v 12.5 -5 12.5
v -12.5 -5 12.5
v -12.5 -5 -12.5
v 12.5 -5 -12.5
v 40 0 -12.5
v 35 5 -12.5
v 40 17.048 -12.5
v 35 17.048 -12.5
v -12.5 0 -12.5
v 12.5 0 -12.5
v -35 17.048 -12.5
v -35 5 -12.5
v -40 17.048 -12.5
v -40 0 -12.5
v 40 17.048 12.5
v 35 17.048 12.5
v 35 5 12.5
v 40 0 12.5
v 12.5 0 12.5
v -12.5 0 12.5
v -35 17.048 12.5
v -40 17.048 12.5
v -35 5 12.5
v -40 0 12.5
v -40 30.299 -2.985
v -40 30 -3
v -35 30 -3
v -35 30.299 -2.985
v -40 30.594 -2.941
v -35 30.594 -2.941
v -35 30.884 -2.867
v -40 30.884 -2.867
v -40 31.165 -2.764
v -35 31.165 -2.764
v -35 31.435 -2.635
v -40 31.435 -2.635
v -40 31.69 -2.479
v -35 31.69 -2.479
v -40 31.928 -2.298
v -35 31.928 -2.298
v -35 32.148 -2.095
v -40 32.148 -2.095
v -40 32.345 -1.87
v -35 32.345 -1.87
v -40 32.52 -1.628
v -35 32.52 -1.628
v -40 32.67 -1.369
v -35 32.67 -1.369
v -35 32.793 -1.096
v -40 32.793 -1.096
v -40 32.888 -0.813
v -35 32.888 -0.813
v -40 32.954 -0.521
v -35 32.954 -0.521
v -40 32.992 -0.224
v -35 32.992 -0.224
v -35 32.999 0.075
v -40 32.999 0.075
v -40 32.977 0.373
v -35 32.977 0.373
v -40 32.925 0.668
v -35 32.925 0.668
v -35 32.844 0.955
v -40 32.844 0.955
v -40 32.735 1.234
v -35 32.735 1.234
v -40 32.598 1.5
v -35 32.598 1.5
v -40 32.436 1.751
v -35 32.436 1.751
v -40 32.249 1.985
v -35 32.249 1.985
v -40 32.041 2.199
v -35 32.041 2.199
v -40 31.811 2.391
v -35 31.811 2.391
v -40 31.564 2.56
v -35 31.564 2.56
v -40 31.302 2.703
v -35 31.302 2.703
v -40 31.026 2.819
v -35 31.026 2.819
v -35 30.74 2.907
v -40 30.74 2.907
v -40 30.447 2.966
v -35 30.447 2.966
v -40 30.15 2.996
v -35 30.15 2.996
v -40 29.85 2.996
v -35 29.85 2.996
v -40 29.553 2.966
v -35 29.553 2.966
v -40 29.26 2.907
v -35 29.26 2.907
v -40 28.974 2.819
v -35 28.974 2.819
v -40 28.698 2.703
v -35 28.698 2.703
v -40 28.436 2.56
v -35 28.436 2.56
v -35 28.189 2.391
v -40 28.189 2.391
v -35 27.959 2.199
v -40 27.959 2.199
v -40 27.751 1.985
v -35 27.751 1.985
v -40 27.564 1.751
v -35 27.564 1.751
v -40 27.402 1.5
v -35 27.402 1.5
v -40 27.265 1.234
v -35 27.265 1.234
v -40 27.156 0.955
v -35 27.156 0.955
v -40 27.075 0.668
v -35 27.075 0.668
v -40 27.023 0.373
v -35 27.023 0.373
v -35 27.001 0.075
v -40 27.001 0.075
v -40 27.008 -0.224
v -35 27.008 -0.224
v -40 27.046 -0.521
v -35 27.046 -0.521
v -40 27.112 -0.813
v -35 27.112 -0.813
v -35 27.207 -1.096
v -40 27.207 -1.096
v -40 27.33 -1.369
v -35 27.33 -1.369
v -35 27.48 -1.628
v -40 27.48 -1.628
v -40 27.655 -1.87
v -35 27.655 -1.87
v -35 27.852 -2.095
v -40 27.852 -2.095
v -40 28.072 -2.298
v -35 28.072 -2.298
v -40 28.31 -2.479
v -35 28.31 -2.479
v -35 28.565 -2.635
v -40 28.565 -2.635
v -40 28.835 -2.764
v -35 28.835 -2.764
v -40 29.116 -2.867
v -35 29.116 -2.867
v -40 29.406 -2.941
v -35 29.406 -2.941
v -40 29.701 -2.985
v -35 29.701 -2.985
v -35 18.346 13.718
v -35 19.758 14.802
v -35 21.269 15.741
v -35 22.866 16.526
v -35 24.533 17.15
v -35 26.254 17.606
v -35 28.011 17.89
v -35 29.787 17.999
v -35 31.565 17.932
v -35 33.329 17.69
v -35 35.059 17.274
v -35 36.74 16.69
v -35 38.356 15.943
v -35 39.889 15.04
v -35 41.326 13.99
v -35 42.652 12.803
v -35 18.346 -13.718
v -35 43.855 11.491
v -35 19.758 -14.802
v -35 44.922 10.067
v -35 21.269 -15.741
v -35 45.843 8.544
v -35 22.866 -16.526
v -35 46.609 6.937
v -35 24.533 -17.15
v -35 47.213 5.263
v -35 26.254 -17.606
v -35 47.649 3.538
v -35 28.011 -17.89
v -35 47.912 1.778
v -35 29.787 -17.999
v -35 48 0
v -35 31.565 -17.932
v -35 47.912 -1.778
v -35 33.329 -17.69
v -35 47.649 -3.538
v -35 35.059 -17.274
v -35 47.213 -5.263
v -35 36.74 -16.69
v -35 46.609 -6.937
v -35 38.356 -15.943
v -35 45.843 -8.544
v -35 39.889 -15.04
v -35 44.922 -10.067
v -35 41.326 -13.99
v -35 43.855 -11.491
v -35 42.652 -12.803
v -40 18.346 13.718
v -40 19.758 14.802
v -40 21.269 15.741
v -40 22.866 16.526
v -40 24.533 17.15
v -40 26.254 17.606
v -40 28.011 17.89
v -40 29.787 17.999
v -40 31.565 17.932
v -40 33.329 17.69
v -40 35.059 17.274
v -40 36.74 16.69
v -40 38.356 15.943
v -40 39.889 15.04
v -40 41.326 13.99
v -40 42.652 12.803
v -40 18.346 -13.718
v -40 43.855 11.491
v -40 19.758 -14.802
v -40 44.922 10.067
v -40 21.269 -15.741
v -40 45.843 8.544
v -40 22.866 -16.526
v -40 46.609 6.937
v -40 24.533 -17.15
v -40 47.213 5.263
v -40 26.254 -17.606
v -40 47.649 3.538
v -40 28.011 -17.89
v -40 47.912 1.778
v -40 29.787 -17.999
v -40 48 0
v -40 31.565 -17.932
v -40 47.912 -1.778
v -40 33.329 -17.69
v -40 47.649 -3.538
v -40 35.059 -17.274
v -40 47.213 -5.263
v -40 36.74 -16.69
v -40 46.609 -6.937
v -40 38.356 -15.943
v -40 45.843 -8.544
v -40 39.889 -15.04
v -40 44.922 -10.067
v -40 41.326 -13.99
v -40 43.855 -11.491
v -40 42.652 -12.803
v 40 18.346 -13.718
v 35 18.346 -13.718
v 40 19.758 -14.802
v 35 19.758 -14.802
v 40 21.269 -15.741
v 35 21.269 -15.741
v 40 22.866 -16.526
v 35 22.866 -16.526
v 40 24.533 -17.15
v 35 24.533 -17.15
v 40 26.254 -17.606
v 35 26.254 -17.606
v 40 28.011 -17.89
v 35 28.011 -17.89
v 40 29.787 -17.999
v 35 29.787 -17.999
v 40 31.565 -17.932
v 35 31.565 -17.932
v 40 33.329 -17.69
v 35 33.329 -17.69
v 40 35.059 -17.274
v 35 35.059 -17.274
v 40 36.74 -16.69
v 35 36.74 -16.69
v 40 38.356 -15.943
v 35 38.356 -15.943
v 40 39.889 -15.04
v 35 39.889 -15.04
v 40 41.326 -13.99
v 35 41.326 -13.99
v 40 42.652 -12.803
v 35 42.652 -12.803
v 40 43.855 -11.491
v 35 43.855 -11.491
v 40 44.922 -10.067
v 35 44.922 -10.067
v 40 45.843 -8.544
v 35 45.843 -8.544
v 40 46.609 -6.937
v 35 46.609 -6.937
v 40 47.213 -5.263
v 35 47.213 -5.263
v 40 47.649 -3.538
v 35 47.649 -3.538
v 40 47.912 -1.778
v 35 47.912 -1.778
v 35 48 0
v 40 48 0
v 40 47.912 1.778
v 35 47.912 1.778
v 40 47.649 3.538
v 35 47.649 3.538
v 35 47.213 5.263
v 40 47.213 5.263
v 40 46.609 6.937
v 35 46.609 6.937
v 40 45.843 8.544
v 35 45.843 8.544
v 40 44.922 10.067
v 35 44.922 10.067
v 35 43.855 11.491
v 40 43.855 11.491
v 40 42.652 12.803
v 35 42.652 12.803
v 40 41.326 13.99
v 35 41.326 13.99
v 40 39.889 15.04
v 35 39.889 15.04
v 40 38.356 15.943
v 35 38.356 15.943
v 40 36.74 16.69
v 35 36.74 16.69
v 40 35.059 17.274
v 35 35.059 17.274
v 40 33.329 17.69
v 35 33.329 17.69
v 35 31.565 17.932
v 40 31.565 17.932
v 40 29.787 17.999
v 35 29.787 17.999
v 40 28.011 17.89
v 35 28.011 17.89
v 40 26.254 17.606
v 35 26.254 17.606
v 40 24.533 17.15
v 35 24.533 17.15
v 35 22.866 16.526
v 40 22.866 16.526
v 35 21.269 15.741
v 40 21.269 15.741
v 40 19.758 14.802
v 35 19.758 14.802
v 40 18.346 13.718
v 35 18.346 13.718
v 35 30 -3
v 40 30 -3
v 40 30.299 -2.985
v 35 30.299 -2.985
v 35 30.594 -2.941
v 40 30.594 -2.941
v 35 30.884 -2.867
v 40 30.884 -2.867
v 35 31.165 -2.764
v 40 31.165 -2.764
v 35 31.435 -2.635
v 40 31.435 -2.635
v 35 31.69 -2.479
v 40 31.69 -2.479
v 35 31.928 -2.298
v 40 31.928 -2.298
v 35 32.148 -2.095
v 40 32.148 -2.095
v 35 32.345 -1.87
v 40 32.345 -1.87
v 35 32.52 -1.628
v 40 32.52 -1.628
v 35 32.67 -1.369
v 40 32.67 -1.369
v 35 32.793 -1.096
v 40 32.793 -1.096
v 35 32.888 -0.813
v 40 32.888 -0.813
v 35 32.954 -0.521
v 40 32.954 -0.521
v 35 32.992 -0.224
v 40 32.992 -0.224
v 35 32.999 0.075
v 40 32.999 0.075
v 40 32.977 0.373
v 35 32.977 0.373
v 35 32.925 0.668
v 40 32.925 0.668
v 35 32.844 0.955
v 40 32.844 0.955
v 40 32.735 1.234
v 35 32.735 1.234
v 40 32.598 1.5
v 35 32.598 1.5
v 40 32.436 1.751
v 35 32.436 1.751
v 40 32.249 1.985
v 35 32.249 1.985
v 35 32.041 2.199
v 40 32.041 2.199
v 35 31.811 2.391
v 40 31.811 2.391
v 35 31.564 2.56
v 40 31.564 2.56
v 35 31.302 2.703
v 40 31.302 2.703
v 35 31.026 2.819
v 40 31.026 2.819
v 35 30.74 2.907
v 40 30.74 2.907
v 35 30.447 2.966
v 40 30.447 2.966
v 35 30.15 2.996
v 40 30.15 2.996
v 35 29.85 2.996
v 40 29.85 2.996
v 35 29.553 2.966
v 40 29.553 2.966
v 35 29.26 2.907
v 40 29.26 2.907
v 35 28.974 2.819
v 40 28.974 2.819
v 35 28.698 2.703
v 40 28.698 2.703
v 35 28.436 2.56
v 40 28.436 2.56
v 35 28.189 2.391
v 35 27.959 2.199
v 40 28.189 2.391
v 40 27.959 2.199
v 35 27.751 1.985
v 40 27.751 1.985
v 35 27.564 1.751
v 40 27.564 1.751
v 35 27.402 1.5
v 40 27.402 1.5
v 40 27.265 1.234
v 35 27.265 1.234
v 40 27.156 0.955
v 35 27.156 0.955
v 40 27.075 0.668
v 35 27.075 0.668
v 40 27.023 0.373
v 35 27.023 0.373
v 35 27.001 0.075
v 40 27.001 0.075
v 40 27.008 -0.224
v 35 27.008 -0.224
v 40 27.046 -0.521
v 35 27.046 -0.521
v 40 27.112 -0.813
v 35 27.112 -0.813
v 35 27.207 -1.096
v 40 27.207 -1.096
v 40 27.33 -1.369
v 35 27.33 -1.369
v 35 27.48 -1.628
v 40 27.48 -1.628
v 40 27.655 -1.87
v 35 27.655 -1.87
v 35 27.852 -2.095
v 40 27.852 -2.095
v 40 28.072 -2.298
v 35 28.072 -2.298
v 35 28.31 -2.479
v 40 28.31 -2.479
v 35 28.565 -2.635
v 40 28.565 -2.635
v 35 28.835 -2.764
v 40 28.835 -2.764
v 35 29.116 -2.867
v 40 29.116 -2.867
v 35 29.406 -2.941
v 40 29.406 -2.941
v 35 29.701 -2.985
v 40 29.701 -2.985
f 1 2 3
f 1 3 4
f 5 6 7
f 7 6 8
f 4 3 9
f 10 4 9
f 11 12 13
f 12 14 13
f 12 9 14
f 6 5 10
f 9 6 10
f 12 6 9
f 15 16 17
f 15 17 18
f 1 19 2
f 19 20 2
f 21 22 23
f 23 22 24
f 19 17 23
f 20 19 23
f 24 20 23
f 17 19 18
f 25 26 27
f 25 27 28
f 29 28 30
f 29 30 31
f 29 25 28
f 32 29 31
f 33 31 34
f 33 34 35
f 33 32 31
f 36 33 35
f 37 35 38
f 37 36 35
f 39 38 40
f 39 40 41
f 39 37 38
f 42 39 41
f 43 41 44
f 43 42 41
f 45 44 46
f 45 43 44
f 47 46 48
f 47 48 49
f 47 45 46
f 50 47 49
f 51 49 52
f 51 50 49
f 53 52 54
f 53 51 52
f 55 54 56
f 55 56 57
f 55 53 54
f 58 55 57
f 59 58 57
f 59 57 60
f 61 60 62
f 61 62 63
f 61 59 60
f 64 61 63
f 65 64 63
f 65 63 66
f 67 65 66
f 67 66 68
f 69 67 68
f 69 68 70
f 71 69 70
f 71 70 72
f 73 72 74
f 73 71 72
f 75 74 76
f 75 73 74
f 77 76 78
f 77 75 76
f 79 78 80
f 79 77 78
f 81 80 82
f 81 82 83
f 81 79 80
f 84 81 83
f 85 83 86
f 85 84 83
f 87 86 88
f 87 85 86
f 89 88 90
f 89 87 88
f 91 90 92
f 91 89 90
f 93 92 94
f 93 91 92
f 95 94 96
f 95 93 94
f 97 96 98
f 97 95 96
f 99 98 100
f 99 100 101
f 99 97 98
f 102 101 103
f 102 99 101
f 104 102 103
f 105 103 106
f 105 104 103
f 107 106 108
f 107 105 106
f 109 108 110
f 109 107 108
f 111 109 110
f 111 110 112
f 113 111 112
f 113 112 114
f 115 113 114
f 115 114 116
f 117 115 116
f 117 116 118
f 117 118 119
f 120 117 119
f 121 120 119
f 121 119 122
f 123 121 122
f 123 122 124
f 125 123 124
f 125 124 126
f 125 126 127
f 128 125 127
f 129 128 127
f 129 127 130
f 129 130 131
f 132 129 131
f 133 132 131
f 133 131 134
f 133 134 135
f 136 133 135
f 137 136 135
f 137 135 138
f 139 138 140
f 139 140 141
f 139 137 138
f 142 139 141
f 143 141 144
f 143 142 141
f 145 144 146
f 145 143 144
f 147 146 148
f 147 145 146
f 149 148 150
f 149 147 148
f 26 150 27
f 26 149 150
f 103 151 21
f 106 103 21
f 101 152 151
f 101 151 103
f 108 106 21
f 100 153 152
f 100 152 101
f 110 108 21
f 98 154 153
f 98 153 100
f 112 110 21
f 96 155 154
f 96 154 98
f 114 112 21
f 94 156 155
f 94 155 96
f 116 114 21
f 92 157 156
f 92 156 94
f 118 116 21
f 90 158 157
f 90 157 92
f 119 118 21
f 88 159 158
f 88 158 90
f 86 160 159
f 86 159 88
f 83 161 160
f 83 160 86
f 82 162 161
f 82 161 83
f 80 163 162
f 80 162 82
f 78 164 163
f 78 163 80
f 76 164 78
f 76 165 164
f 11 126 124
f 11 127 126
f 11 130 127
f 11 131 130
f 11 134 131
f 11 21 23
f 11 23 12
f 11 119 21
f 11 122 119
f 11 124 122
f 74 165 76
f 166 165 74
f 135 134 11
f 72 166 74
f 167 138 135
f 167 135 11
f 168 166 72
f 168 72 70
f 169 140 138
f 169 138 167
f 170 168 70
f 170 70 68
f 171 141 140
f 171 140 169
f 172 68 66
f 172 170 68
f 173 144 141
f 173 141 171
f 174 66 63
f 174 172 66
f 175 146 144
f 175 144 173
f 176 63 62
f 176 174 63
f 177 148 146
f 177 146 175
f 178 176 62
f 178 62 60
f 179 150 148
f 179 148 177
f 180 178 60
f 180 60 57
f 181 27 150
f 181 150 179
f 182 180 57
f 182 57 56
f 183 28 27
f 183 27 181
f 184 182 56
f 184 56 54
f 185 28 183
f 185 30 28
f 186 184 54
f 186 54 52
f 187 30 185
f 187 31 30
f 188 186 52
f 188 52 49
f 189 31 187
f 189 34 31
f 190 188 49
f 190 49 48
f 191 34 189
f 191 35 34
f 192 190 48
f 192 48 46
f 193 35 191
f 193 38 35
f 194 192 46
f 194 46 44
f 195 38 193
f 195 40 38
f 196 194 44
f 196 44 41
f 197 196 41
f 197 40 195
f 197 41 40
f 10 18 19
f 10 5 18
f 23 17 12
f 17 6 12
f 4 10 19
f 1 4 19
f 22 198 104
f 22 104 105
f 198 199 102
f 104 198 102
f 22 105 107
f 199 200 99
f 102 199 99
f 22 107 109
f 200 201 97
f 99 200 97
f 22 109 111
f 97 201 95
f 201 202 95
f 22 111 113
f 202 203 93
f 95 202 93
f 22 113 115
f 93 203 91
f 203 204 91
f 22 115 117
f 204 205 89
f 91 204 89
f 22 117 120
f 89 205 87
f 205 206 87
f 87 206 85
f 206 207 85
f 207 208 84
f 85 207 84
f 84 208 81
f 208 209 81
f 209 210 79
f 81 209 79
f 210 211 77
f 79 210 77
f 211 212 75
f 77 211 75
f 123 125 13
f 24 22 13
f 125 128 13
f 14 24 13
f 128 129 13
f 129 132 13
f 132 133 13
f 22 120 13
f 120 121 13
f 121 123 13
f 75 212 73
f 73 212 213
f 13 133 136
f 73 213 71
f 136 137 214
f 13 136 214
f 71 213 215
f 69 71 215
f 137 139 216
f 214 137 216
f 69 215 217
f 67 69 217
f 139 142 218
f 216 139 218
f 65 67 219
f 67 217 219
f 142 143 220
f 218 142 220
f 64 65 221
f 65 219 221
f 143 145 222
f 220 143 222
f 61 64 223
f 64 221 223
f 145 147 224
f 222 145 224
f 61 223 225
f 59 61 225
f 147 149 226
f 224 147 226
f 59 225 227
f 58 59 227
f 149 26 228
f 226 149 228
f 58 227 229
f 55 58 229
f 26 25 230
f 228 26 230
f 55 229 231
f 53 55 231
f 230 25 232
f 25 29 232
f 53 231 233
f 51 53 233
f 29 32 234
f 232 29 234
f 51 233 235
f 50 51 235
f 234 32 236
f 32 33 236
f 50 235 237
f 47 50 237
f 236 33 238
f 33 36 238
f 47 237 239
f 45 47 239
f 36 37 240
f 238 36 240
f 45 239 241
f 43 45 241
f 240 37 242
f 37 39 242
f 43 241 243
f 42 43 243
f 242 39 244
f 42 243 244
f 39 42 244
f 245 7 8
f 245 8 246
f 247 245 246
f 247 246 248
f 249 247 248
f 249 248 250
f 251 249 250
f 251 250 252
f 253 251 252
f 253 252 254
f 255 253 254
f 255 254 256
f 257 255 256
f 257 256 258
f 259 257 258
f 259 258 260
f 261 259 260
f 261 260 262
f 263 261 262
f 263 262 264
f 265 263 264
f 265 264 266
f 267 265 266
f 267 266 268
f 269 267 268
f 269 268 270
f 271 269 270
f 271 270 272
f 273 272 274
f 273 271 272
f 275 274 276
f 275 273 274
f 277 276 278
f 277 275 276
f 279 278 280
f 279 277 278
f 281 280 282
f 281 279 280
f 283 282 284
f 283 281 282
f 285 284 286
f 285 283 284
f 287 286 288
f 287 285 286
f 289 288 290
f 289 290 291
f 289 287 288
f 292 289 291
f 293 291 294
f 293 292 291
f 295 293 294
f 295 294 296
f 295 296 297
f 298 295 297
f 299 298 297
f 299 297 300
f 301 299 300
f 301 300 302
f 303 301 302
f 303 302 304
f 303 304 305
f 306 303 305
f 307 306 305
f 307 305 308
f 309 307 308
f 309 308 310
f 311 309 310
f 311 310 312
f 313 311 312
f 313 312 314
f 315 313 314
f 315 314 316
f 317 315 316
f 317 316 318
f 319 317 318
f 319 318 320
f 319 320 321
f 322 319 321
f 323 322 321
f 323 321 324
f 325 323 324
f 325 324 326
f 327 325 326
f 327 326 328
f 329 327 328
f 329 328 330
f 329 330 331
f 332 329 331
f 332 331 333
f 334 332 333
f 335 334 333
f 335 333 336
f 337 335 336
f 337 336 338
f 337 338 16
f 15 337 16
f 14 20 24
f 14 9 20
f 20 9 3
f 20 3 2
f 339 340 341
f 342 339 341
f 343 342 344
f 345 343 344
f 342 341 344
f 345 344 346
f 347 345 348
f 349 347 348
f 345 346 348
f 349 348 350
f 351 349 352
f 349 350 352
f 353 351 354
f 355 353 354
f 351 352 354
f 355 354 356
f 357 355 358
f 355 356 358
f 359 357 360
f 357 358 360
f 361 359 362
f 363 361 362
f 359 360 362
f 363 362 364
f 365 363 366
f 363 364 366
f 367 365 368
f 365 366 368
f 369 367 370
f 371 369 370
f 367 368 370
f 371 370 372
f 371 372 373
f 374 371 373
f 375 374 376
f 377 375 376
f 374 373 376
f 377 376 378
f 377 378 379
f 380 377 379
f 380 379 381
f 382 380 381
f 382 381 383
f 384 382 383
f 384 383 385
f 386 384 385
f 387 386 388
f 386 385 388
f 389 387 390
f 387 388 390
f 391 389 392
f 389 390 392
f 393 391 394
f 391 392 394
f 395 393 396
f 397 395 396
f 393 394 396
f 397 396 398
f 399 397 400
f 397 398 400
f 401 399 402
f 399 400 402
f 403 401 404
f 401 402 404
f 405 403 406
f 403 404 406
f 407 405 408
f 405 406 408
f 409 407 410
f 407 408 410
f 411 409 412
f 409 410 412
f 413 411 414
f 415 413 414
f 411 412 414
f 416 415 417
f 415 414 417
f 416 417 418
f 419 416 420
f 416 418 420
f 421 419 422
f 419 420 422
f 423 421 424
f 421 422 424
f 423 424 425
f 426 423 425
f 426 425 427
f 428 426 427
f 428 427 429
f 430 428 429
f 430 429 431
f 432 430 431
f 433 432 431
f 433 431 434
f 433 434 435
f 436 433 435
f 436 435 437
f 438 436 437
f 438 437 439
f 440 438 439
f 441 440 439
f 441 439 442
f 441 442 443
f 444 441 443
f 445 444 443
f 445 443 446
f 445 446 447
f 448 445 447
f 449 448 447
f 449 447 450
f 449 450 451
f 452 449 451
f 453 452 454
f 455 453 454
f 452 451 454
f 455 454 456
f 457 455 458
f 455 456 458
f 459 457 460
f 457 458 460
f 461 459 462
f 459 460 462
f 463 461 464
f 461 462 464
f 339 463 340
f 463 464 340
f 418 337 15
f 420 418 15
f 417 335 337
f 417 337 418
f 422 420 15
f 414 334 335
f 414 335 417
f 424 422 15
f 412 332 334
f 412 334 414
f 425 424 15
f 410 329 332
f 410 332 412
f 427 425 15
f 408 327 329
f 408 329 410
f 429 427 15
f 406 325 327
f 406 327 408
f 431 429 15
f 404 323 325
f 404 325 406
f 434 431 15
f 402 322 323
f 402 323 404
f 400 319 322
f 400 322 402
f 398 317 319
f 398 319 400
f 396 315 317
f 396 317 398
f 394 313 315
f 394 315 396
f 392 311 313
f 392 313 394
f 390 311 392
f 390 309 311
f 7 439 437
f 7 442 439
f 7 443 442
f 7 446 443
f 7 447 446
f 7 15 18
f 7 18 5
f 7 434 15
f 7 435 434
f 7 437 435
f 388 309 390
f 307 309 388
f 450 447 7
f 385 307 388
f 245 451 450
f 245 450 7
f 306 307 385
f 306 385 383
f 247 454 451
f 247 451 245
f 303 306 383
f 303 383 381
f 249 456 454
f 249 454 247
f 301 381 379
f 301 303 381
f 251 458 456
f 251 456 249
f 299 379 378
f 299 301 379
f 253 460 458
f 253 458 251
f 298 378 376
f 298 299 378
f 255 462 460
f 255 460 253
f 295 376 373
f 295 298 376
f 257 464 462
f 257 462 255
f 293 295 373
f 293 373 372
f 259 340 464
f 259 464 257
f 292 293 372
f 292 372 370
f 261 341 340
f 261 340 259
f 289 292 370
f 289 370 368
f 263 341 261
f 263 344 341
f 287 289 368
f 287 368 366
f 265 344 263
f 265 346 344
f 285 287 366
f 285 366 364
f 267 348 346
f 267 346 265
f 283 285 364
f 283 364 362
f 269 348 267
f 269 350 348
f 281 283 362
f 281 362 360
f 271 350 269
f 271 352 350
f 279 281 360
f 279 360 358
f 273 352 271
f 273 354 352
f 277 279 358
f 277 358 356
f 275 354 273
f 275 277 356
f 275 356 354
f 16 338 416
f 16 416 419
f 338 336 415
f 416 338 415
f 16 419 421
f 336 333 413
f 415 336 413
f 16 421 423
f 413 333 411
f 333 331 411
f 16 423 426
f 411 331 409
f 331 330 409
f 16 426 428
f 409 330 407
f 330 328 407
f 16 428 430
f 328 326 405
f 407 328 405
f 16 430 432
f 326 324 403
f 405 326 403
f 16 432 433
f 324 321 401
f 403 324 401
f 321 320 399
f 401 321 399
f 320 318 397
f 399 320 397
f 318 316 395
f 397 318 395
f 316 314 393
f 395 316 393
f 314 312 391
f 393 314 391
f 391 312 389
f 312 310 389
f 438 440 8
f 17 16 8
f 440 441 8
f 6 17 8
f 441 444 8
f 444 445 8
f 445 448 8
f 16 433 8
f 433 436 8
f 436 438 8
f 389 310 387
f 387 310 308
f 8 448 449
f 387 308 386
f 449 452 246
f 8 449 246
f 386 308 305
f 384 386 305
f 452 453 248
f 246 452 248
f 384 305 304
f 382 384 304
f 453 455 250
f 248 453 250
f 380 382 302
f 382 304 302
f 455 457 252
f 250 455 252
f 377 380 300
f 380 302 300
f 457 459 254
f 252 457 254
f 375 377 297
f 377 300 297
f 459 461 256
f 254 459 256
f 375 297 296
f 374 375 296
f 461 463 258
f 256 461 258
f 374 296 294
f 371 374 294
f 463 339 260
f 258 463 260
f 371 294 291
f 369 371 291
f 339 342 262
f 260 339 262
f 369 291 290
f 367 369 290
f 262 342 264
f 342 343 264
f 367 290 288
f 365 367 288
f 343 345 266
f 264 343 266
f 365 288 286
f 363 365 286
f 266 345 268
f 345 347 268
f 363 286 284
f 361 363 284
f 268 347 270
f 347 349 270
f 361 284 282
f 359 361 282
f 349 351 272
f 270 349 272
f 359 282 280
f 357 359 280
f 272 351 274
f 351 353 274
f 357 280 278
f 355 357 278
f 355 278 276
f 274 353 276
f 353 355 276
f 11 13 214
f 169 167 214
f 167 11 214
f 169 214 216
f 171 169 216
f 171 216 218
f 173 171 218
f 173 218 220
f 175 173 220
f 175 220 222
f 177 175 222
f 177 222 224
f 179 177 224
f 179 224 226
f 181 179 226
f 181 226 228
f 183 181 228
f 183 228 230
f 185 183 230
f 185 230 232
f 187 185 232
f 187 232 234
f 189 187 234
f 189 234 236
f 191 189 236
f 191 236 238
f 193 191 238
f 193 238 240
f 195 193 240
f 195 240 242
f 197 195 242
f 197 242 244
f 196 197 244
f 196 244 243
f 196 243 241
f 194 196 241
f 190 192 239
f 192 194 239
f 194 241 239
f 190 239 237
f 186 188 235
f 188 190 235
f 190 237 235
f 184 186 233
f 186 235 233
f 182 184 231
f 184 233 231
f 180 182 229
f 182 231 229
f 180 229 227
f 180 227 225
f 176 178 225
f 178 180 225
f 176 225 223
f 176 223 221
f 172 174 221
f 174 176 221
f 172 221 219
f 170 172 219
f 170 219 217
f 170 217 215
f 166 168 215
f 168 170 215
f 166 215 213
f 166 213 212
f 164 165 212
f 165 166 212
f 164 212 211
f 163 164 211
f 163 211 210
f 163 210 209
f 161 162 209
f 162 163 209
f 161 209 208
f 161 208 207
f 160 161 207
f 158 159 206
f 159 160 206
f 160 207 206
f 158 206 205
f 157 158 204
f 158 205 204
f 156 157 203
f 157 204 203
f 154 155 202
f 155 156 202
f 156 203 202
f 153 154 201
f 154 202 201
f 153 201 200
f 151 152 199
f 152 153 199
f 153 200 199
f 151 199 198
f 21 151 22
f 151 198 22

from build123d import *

# Parameters (mm, degrees)
SKETCH1_W           = 40
SKETCH1_H           = 25
BOSS_EXTRUDE1_DEPTH = 5
SKETCH6_R           = 18
SKETCH6_R_2         = 3
BOSS_EXTRUDE4_DEPTH = 5
SKETCH7_W           = 25
SKETCH7_H           = 25
BOSS_EXTRUDE5_DEPTH = 5


with BuildPart() as part:
    # Sketch1 → Boss-Extrude1 (new body)
    with BuildSketch(Plane(origin=(0, 0, 0), x_dir=(1, 0, 0), z_dir=(0, 1, 0))):
        with Locations((20, 0)):
            Rectangle(SKETCH1_W, SKETCH1_H)
    boss_extrude1 = extrude(amount=BOSS_EXTRUDE1_DEPTH)

    # Sketch6 → Boss-Extrude4 (add)
    # profile 1 of 2: a face of its own
    with BuildSketch(Plane(origin=(40, 0, 0), x_dir=(0, 0, -1), z_dir=(1, 0, 0))):
        with Locations((0, 30)):
            Circle(SKETCH6_R)
        with Locations((0, 30)):
            Circle(SKETCH6_R_2, mode=Mode.SUBTRACT)
    # profile 2 of 2: a face of its own
    with BuildSketch(Plane(origin=(40, 0, 0), x_dir=(0, 0, -1), z_dir=(1, 0, 0))):
        with BuildLine():
            ThreePointArc((12.5, 17.048166153), (0, 12), (-12.5, 17.048166153))
            Line((-12.5, 17.048166153), (-12.5, 5))
            Line((-12.5, 5), (12.5, 5))
            Line((12.5, 5), (12.5, 17.048166153))
        make_face()
    boss_extrude4 = extrude(amount=-BOSS_EXTRUDE4_DEPTH)

    # Mirror2: Boss-Extrude1, Boss-Extrude4 across plane
    add(boss_extrude1.mirror(Plane(origin=(0, 5, -12.5), x_dir=(0, 0, 1), z_dir=(1, 0, 0))))
    add(boss_extrude4.mirror(Plane(origin=(0, 5, -12.5), x_dir=(0, 0, 1), z_dir=(1, 0, 0))))

    # Sketch7 → Boss-Extrude5 (add)
    with BuildSketch(Plane.XZ):
        Rectangle(SKETCH7_W, SKETCH7_H)
    extrude(amount=BOSS_EXTRUDE5_DEPTH)


solid = part.part
